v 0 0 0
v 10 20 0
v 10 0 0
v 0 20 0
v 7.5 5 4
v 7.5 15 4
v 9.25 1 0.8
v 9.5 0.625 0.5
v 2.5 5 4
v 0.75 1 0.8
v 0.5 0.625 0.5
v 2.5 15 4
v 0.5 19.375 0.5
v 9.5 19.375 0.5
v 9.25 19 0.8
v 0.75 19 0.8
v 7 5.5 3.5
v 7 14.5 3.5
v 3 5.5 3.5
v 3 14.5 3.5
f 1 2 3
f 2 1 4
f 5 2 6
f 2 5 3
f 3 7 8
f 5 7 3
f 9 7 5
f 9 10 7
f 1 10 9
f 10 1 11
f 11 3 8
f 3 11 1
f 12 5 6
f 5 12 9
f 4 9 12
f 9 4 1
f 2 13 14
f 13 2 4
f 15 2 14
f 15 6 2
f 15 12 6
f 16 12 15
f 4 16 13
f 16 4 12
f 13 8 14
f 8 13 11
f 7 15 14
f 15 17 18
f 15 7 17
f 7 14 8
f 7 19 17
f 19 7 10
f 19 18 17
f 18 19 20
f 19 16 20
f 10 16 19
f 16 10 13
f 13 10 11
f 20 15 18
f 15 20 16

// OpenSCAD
module fustrum(
    bw, // bottom width
    bd, // bottom depth
    tw, // top width
    td, // top depth
    xs, // x skew
    ys, // y skew
    ht  // height
)
{
    Points = [
        [ 0,     0,      0 ], // 0
        [ bw,    0,      0 ], // 1
        [ bw,    bd,     0 ], // 2
        [ 0,     bd,     0 ], // 3
        [ xs,    ys,    ht ], // 4
        [ xs+tw, ys,    ht ], // 5
        [ xs+tw, ys+td, ht ], // 6
        [ xs,    ys+td, ht ], // 7
    ];
    
    Faces = [
        [ 0, 1, 2, 3 ], // bottom
        [ 4, 5, 1, 0 ], // front
        [ 7, 6, 5, 4 ], // top
        [ 5, 6, 2, 1 ], // right
        [ 6, 7, 3, 2 ], // back
        [ 7, 4, 0, 3 ] // left
    ];
    
    polyhedron(Points, Faces);
}

module centered_fustrum(
    bw, // bottom width
    bd, // bottom depth
    tw, // top width
    td, // top depth
    ht  // height
)
{
    xs = (bw - tw) / 2; // x skew
    ys = (bd - td) / 2; // y skew
    
    fustrum(bw, bd, tw, td, xs, ys, ht);
}

difference()
{
    centered_fustrum(10, 20, 5, 10, 4);
    
    translate([0.5, 0.5, 0.5])
    centered_fustrum( 9, 19, 4,  9, 3);
}
